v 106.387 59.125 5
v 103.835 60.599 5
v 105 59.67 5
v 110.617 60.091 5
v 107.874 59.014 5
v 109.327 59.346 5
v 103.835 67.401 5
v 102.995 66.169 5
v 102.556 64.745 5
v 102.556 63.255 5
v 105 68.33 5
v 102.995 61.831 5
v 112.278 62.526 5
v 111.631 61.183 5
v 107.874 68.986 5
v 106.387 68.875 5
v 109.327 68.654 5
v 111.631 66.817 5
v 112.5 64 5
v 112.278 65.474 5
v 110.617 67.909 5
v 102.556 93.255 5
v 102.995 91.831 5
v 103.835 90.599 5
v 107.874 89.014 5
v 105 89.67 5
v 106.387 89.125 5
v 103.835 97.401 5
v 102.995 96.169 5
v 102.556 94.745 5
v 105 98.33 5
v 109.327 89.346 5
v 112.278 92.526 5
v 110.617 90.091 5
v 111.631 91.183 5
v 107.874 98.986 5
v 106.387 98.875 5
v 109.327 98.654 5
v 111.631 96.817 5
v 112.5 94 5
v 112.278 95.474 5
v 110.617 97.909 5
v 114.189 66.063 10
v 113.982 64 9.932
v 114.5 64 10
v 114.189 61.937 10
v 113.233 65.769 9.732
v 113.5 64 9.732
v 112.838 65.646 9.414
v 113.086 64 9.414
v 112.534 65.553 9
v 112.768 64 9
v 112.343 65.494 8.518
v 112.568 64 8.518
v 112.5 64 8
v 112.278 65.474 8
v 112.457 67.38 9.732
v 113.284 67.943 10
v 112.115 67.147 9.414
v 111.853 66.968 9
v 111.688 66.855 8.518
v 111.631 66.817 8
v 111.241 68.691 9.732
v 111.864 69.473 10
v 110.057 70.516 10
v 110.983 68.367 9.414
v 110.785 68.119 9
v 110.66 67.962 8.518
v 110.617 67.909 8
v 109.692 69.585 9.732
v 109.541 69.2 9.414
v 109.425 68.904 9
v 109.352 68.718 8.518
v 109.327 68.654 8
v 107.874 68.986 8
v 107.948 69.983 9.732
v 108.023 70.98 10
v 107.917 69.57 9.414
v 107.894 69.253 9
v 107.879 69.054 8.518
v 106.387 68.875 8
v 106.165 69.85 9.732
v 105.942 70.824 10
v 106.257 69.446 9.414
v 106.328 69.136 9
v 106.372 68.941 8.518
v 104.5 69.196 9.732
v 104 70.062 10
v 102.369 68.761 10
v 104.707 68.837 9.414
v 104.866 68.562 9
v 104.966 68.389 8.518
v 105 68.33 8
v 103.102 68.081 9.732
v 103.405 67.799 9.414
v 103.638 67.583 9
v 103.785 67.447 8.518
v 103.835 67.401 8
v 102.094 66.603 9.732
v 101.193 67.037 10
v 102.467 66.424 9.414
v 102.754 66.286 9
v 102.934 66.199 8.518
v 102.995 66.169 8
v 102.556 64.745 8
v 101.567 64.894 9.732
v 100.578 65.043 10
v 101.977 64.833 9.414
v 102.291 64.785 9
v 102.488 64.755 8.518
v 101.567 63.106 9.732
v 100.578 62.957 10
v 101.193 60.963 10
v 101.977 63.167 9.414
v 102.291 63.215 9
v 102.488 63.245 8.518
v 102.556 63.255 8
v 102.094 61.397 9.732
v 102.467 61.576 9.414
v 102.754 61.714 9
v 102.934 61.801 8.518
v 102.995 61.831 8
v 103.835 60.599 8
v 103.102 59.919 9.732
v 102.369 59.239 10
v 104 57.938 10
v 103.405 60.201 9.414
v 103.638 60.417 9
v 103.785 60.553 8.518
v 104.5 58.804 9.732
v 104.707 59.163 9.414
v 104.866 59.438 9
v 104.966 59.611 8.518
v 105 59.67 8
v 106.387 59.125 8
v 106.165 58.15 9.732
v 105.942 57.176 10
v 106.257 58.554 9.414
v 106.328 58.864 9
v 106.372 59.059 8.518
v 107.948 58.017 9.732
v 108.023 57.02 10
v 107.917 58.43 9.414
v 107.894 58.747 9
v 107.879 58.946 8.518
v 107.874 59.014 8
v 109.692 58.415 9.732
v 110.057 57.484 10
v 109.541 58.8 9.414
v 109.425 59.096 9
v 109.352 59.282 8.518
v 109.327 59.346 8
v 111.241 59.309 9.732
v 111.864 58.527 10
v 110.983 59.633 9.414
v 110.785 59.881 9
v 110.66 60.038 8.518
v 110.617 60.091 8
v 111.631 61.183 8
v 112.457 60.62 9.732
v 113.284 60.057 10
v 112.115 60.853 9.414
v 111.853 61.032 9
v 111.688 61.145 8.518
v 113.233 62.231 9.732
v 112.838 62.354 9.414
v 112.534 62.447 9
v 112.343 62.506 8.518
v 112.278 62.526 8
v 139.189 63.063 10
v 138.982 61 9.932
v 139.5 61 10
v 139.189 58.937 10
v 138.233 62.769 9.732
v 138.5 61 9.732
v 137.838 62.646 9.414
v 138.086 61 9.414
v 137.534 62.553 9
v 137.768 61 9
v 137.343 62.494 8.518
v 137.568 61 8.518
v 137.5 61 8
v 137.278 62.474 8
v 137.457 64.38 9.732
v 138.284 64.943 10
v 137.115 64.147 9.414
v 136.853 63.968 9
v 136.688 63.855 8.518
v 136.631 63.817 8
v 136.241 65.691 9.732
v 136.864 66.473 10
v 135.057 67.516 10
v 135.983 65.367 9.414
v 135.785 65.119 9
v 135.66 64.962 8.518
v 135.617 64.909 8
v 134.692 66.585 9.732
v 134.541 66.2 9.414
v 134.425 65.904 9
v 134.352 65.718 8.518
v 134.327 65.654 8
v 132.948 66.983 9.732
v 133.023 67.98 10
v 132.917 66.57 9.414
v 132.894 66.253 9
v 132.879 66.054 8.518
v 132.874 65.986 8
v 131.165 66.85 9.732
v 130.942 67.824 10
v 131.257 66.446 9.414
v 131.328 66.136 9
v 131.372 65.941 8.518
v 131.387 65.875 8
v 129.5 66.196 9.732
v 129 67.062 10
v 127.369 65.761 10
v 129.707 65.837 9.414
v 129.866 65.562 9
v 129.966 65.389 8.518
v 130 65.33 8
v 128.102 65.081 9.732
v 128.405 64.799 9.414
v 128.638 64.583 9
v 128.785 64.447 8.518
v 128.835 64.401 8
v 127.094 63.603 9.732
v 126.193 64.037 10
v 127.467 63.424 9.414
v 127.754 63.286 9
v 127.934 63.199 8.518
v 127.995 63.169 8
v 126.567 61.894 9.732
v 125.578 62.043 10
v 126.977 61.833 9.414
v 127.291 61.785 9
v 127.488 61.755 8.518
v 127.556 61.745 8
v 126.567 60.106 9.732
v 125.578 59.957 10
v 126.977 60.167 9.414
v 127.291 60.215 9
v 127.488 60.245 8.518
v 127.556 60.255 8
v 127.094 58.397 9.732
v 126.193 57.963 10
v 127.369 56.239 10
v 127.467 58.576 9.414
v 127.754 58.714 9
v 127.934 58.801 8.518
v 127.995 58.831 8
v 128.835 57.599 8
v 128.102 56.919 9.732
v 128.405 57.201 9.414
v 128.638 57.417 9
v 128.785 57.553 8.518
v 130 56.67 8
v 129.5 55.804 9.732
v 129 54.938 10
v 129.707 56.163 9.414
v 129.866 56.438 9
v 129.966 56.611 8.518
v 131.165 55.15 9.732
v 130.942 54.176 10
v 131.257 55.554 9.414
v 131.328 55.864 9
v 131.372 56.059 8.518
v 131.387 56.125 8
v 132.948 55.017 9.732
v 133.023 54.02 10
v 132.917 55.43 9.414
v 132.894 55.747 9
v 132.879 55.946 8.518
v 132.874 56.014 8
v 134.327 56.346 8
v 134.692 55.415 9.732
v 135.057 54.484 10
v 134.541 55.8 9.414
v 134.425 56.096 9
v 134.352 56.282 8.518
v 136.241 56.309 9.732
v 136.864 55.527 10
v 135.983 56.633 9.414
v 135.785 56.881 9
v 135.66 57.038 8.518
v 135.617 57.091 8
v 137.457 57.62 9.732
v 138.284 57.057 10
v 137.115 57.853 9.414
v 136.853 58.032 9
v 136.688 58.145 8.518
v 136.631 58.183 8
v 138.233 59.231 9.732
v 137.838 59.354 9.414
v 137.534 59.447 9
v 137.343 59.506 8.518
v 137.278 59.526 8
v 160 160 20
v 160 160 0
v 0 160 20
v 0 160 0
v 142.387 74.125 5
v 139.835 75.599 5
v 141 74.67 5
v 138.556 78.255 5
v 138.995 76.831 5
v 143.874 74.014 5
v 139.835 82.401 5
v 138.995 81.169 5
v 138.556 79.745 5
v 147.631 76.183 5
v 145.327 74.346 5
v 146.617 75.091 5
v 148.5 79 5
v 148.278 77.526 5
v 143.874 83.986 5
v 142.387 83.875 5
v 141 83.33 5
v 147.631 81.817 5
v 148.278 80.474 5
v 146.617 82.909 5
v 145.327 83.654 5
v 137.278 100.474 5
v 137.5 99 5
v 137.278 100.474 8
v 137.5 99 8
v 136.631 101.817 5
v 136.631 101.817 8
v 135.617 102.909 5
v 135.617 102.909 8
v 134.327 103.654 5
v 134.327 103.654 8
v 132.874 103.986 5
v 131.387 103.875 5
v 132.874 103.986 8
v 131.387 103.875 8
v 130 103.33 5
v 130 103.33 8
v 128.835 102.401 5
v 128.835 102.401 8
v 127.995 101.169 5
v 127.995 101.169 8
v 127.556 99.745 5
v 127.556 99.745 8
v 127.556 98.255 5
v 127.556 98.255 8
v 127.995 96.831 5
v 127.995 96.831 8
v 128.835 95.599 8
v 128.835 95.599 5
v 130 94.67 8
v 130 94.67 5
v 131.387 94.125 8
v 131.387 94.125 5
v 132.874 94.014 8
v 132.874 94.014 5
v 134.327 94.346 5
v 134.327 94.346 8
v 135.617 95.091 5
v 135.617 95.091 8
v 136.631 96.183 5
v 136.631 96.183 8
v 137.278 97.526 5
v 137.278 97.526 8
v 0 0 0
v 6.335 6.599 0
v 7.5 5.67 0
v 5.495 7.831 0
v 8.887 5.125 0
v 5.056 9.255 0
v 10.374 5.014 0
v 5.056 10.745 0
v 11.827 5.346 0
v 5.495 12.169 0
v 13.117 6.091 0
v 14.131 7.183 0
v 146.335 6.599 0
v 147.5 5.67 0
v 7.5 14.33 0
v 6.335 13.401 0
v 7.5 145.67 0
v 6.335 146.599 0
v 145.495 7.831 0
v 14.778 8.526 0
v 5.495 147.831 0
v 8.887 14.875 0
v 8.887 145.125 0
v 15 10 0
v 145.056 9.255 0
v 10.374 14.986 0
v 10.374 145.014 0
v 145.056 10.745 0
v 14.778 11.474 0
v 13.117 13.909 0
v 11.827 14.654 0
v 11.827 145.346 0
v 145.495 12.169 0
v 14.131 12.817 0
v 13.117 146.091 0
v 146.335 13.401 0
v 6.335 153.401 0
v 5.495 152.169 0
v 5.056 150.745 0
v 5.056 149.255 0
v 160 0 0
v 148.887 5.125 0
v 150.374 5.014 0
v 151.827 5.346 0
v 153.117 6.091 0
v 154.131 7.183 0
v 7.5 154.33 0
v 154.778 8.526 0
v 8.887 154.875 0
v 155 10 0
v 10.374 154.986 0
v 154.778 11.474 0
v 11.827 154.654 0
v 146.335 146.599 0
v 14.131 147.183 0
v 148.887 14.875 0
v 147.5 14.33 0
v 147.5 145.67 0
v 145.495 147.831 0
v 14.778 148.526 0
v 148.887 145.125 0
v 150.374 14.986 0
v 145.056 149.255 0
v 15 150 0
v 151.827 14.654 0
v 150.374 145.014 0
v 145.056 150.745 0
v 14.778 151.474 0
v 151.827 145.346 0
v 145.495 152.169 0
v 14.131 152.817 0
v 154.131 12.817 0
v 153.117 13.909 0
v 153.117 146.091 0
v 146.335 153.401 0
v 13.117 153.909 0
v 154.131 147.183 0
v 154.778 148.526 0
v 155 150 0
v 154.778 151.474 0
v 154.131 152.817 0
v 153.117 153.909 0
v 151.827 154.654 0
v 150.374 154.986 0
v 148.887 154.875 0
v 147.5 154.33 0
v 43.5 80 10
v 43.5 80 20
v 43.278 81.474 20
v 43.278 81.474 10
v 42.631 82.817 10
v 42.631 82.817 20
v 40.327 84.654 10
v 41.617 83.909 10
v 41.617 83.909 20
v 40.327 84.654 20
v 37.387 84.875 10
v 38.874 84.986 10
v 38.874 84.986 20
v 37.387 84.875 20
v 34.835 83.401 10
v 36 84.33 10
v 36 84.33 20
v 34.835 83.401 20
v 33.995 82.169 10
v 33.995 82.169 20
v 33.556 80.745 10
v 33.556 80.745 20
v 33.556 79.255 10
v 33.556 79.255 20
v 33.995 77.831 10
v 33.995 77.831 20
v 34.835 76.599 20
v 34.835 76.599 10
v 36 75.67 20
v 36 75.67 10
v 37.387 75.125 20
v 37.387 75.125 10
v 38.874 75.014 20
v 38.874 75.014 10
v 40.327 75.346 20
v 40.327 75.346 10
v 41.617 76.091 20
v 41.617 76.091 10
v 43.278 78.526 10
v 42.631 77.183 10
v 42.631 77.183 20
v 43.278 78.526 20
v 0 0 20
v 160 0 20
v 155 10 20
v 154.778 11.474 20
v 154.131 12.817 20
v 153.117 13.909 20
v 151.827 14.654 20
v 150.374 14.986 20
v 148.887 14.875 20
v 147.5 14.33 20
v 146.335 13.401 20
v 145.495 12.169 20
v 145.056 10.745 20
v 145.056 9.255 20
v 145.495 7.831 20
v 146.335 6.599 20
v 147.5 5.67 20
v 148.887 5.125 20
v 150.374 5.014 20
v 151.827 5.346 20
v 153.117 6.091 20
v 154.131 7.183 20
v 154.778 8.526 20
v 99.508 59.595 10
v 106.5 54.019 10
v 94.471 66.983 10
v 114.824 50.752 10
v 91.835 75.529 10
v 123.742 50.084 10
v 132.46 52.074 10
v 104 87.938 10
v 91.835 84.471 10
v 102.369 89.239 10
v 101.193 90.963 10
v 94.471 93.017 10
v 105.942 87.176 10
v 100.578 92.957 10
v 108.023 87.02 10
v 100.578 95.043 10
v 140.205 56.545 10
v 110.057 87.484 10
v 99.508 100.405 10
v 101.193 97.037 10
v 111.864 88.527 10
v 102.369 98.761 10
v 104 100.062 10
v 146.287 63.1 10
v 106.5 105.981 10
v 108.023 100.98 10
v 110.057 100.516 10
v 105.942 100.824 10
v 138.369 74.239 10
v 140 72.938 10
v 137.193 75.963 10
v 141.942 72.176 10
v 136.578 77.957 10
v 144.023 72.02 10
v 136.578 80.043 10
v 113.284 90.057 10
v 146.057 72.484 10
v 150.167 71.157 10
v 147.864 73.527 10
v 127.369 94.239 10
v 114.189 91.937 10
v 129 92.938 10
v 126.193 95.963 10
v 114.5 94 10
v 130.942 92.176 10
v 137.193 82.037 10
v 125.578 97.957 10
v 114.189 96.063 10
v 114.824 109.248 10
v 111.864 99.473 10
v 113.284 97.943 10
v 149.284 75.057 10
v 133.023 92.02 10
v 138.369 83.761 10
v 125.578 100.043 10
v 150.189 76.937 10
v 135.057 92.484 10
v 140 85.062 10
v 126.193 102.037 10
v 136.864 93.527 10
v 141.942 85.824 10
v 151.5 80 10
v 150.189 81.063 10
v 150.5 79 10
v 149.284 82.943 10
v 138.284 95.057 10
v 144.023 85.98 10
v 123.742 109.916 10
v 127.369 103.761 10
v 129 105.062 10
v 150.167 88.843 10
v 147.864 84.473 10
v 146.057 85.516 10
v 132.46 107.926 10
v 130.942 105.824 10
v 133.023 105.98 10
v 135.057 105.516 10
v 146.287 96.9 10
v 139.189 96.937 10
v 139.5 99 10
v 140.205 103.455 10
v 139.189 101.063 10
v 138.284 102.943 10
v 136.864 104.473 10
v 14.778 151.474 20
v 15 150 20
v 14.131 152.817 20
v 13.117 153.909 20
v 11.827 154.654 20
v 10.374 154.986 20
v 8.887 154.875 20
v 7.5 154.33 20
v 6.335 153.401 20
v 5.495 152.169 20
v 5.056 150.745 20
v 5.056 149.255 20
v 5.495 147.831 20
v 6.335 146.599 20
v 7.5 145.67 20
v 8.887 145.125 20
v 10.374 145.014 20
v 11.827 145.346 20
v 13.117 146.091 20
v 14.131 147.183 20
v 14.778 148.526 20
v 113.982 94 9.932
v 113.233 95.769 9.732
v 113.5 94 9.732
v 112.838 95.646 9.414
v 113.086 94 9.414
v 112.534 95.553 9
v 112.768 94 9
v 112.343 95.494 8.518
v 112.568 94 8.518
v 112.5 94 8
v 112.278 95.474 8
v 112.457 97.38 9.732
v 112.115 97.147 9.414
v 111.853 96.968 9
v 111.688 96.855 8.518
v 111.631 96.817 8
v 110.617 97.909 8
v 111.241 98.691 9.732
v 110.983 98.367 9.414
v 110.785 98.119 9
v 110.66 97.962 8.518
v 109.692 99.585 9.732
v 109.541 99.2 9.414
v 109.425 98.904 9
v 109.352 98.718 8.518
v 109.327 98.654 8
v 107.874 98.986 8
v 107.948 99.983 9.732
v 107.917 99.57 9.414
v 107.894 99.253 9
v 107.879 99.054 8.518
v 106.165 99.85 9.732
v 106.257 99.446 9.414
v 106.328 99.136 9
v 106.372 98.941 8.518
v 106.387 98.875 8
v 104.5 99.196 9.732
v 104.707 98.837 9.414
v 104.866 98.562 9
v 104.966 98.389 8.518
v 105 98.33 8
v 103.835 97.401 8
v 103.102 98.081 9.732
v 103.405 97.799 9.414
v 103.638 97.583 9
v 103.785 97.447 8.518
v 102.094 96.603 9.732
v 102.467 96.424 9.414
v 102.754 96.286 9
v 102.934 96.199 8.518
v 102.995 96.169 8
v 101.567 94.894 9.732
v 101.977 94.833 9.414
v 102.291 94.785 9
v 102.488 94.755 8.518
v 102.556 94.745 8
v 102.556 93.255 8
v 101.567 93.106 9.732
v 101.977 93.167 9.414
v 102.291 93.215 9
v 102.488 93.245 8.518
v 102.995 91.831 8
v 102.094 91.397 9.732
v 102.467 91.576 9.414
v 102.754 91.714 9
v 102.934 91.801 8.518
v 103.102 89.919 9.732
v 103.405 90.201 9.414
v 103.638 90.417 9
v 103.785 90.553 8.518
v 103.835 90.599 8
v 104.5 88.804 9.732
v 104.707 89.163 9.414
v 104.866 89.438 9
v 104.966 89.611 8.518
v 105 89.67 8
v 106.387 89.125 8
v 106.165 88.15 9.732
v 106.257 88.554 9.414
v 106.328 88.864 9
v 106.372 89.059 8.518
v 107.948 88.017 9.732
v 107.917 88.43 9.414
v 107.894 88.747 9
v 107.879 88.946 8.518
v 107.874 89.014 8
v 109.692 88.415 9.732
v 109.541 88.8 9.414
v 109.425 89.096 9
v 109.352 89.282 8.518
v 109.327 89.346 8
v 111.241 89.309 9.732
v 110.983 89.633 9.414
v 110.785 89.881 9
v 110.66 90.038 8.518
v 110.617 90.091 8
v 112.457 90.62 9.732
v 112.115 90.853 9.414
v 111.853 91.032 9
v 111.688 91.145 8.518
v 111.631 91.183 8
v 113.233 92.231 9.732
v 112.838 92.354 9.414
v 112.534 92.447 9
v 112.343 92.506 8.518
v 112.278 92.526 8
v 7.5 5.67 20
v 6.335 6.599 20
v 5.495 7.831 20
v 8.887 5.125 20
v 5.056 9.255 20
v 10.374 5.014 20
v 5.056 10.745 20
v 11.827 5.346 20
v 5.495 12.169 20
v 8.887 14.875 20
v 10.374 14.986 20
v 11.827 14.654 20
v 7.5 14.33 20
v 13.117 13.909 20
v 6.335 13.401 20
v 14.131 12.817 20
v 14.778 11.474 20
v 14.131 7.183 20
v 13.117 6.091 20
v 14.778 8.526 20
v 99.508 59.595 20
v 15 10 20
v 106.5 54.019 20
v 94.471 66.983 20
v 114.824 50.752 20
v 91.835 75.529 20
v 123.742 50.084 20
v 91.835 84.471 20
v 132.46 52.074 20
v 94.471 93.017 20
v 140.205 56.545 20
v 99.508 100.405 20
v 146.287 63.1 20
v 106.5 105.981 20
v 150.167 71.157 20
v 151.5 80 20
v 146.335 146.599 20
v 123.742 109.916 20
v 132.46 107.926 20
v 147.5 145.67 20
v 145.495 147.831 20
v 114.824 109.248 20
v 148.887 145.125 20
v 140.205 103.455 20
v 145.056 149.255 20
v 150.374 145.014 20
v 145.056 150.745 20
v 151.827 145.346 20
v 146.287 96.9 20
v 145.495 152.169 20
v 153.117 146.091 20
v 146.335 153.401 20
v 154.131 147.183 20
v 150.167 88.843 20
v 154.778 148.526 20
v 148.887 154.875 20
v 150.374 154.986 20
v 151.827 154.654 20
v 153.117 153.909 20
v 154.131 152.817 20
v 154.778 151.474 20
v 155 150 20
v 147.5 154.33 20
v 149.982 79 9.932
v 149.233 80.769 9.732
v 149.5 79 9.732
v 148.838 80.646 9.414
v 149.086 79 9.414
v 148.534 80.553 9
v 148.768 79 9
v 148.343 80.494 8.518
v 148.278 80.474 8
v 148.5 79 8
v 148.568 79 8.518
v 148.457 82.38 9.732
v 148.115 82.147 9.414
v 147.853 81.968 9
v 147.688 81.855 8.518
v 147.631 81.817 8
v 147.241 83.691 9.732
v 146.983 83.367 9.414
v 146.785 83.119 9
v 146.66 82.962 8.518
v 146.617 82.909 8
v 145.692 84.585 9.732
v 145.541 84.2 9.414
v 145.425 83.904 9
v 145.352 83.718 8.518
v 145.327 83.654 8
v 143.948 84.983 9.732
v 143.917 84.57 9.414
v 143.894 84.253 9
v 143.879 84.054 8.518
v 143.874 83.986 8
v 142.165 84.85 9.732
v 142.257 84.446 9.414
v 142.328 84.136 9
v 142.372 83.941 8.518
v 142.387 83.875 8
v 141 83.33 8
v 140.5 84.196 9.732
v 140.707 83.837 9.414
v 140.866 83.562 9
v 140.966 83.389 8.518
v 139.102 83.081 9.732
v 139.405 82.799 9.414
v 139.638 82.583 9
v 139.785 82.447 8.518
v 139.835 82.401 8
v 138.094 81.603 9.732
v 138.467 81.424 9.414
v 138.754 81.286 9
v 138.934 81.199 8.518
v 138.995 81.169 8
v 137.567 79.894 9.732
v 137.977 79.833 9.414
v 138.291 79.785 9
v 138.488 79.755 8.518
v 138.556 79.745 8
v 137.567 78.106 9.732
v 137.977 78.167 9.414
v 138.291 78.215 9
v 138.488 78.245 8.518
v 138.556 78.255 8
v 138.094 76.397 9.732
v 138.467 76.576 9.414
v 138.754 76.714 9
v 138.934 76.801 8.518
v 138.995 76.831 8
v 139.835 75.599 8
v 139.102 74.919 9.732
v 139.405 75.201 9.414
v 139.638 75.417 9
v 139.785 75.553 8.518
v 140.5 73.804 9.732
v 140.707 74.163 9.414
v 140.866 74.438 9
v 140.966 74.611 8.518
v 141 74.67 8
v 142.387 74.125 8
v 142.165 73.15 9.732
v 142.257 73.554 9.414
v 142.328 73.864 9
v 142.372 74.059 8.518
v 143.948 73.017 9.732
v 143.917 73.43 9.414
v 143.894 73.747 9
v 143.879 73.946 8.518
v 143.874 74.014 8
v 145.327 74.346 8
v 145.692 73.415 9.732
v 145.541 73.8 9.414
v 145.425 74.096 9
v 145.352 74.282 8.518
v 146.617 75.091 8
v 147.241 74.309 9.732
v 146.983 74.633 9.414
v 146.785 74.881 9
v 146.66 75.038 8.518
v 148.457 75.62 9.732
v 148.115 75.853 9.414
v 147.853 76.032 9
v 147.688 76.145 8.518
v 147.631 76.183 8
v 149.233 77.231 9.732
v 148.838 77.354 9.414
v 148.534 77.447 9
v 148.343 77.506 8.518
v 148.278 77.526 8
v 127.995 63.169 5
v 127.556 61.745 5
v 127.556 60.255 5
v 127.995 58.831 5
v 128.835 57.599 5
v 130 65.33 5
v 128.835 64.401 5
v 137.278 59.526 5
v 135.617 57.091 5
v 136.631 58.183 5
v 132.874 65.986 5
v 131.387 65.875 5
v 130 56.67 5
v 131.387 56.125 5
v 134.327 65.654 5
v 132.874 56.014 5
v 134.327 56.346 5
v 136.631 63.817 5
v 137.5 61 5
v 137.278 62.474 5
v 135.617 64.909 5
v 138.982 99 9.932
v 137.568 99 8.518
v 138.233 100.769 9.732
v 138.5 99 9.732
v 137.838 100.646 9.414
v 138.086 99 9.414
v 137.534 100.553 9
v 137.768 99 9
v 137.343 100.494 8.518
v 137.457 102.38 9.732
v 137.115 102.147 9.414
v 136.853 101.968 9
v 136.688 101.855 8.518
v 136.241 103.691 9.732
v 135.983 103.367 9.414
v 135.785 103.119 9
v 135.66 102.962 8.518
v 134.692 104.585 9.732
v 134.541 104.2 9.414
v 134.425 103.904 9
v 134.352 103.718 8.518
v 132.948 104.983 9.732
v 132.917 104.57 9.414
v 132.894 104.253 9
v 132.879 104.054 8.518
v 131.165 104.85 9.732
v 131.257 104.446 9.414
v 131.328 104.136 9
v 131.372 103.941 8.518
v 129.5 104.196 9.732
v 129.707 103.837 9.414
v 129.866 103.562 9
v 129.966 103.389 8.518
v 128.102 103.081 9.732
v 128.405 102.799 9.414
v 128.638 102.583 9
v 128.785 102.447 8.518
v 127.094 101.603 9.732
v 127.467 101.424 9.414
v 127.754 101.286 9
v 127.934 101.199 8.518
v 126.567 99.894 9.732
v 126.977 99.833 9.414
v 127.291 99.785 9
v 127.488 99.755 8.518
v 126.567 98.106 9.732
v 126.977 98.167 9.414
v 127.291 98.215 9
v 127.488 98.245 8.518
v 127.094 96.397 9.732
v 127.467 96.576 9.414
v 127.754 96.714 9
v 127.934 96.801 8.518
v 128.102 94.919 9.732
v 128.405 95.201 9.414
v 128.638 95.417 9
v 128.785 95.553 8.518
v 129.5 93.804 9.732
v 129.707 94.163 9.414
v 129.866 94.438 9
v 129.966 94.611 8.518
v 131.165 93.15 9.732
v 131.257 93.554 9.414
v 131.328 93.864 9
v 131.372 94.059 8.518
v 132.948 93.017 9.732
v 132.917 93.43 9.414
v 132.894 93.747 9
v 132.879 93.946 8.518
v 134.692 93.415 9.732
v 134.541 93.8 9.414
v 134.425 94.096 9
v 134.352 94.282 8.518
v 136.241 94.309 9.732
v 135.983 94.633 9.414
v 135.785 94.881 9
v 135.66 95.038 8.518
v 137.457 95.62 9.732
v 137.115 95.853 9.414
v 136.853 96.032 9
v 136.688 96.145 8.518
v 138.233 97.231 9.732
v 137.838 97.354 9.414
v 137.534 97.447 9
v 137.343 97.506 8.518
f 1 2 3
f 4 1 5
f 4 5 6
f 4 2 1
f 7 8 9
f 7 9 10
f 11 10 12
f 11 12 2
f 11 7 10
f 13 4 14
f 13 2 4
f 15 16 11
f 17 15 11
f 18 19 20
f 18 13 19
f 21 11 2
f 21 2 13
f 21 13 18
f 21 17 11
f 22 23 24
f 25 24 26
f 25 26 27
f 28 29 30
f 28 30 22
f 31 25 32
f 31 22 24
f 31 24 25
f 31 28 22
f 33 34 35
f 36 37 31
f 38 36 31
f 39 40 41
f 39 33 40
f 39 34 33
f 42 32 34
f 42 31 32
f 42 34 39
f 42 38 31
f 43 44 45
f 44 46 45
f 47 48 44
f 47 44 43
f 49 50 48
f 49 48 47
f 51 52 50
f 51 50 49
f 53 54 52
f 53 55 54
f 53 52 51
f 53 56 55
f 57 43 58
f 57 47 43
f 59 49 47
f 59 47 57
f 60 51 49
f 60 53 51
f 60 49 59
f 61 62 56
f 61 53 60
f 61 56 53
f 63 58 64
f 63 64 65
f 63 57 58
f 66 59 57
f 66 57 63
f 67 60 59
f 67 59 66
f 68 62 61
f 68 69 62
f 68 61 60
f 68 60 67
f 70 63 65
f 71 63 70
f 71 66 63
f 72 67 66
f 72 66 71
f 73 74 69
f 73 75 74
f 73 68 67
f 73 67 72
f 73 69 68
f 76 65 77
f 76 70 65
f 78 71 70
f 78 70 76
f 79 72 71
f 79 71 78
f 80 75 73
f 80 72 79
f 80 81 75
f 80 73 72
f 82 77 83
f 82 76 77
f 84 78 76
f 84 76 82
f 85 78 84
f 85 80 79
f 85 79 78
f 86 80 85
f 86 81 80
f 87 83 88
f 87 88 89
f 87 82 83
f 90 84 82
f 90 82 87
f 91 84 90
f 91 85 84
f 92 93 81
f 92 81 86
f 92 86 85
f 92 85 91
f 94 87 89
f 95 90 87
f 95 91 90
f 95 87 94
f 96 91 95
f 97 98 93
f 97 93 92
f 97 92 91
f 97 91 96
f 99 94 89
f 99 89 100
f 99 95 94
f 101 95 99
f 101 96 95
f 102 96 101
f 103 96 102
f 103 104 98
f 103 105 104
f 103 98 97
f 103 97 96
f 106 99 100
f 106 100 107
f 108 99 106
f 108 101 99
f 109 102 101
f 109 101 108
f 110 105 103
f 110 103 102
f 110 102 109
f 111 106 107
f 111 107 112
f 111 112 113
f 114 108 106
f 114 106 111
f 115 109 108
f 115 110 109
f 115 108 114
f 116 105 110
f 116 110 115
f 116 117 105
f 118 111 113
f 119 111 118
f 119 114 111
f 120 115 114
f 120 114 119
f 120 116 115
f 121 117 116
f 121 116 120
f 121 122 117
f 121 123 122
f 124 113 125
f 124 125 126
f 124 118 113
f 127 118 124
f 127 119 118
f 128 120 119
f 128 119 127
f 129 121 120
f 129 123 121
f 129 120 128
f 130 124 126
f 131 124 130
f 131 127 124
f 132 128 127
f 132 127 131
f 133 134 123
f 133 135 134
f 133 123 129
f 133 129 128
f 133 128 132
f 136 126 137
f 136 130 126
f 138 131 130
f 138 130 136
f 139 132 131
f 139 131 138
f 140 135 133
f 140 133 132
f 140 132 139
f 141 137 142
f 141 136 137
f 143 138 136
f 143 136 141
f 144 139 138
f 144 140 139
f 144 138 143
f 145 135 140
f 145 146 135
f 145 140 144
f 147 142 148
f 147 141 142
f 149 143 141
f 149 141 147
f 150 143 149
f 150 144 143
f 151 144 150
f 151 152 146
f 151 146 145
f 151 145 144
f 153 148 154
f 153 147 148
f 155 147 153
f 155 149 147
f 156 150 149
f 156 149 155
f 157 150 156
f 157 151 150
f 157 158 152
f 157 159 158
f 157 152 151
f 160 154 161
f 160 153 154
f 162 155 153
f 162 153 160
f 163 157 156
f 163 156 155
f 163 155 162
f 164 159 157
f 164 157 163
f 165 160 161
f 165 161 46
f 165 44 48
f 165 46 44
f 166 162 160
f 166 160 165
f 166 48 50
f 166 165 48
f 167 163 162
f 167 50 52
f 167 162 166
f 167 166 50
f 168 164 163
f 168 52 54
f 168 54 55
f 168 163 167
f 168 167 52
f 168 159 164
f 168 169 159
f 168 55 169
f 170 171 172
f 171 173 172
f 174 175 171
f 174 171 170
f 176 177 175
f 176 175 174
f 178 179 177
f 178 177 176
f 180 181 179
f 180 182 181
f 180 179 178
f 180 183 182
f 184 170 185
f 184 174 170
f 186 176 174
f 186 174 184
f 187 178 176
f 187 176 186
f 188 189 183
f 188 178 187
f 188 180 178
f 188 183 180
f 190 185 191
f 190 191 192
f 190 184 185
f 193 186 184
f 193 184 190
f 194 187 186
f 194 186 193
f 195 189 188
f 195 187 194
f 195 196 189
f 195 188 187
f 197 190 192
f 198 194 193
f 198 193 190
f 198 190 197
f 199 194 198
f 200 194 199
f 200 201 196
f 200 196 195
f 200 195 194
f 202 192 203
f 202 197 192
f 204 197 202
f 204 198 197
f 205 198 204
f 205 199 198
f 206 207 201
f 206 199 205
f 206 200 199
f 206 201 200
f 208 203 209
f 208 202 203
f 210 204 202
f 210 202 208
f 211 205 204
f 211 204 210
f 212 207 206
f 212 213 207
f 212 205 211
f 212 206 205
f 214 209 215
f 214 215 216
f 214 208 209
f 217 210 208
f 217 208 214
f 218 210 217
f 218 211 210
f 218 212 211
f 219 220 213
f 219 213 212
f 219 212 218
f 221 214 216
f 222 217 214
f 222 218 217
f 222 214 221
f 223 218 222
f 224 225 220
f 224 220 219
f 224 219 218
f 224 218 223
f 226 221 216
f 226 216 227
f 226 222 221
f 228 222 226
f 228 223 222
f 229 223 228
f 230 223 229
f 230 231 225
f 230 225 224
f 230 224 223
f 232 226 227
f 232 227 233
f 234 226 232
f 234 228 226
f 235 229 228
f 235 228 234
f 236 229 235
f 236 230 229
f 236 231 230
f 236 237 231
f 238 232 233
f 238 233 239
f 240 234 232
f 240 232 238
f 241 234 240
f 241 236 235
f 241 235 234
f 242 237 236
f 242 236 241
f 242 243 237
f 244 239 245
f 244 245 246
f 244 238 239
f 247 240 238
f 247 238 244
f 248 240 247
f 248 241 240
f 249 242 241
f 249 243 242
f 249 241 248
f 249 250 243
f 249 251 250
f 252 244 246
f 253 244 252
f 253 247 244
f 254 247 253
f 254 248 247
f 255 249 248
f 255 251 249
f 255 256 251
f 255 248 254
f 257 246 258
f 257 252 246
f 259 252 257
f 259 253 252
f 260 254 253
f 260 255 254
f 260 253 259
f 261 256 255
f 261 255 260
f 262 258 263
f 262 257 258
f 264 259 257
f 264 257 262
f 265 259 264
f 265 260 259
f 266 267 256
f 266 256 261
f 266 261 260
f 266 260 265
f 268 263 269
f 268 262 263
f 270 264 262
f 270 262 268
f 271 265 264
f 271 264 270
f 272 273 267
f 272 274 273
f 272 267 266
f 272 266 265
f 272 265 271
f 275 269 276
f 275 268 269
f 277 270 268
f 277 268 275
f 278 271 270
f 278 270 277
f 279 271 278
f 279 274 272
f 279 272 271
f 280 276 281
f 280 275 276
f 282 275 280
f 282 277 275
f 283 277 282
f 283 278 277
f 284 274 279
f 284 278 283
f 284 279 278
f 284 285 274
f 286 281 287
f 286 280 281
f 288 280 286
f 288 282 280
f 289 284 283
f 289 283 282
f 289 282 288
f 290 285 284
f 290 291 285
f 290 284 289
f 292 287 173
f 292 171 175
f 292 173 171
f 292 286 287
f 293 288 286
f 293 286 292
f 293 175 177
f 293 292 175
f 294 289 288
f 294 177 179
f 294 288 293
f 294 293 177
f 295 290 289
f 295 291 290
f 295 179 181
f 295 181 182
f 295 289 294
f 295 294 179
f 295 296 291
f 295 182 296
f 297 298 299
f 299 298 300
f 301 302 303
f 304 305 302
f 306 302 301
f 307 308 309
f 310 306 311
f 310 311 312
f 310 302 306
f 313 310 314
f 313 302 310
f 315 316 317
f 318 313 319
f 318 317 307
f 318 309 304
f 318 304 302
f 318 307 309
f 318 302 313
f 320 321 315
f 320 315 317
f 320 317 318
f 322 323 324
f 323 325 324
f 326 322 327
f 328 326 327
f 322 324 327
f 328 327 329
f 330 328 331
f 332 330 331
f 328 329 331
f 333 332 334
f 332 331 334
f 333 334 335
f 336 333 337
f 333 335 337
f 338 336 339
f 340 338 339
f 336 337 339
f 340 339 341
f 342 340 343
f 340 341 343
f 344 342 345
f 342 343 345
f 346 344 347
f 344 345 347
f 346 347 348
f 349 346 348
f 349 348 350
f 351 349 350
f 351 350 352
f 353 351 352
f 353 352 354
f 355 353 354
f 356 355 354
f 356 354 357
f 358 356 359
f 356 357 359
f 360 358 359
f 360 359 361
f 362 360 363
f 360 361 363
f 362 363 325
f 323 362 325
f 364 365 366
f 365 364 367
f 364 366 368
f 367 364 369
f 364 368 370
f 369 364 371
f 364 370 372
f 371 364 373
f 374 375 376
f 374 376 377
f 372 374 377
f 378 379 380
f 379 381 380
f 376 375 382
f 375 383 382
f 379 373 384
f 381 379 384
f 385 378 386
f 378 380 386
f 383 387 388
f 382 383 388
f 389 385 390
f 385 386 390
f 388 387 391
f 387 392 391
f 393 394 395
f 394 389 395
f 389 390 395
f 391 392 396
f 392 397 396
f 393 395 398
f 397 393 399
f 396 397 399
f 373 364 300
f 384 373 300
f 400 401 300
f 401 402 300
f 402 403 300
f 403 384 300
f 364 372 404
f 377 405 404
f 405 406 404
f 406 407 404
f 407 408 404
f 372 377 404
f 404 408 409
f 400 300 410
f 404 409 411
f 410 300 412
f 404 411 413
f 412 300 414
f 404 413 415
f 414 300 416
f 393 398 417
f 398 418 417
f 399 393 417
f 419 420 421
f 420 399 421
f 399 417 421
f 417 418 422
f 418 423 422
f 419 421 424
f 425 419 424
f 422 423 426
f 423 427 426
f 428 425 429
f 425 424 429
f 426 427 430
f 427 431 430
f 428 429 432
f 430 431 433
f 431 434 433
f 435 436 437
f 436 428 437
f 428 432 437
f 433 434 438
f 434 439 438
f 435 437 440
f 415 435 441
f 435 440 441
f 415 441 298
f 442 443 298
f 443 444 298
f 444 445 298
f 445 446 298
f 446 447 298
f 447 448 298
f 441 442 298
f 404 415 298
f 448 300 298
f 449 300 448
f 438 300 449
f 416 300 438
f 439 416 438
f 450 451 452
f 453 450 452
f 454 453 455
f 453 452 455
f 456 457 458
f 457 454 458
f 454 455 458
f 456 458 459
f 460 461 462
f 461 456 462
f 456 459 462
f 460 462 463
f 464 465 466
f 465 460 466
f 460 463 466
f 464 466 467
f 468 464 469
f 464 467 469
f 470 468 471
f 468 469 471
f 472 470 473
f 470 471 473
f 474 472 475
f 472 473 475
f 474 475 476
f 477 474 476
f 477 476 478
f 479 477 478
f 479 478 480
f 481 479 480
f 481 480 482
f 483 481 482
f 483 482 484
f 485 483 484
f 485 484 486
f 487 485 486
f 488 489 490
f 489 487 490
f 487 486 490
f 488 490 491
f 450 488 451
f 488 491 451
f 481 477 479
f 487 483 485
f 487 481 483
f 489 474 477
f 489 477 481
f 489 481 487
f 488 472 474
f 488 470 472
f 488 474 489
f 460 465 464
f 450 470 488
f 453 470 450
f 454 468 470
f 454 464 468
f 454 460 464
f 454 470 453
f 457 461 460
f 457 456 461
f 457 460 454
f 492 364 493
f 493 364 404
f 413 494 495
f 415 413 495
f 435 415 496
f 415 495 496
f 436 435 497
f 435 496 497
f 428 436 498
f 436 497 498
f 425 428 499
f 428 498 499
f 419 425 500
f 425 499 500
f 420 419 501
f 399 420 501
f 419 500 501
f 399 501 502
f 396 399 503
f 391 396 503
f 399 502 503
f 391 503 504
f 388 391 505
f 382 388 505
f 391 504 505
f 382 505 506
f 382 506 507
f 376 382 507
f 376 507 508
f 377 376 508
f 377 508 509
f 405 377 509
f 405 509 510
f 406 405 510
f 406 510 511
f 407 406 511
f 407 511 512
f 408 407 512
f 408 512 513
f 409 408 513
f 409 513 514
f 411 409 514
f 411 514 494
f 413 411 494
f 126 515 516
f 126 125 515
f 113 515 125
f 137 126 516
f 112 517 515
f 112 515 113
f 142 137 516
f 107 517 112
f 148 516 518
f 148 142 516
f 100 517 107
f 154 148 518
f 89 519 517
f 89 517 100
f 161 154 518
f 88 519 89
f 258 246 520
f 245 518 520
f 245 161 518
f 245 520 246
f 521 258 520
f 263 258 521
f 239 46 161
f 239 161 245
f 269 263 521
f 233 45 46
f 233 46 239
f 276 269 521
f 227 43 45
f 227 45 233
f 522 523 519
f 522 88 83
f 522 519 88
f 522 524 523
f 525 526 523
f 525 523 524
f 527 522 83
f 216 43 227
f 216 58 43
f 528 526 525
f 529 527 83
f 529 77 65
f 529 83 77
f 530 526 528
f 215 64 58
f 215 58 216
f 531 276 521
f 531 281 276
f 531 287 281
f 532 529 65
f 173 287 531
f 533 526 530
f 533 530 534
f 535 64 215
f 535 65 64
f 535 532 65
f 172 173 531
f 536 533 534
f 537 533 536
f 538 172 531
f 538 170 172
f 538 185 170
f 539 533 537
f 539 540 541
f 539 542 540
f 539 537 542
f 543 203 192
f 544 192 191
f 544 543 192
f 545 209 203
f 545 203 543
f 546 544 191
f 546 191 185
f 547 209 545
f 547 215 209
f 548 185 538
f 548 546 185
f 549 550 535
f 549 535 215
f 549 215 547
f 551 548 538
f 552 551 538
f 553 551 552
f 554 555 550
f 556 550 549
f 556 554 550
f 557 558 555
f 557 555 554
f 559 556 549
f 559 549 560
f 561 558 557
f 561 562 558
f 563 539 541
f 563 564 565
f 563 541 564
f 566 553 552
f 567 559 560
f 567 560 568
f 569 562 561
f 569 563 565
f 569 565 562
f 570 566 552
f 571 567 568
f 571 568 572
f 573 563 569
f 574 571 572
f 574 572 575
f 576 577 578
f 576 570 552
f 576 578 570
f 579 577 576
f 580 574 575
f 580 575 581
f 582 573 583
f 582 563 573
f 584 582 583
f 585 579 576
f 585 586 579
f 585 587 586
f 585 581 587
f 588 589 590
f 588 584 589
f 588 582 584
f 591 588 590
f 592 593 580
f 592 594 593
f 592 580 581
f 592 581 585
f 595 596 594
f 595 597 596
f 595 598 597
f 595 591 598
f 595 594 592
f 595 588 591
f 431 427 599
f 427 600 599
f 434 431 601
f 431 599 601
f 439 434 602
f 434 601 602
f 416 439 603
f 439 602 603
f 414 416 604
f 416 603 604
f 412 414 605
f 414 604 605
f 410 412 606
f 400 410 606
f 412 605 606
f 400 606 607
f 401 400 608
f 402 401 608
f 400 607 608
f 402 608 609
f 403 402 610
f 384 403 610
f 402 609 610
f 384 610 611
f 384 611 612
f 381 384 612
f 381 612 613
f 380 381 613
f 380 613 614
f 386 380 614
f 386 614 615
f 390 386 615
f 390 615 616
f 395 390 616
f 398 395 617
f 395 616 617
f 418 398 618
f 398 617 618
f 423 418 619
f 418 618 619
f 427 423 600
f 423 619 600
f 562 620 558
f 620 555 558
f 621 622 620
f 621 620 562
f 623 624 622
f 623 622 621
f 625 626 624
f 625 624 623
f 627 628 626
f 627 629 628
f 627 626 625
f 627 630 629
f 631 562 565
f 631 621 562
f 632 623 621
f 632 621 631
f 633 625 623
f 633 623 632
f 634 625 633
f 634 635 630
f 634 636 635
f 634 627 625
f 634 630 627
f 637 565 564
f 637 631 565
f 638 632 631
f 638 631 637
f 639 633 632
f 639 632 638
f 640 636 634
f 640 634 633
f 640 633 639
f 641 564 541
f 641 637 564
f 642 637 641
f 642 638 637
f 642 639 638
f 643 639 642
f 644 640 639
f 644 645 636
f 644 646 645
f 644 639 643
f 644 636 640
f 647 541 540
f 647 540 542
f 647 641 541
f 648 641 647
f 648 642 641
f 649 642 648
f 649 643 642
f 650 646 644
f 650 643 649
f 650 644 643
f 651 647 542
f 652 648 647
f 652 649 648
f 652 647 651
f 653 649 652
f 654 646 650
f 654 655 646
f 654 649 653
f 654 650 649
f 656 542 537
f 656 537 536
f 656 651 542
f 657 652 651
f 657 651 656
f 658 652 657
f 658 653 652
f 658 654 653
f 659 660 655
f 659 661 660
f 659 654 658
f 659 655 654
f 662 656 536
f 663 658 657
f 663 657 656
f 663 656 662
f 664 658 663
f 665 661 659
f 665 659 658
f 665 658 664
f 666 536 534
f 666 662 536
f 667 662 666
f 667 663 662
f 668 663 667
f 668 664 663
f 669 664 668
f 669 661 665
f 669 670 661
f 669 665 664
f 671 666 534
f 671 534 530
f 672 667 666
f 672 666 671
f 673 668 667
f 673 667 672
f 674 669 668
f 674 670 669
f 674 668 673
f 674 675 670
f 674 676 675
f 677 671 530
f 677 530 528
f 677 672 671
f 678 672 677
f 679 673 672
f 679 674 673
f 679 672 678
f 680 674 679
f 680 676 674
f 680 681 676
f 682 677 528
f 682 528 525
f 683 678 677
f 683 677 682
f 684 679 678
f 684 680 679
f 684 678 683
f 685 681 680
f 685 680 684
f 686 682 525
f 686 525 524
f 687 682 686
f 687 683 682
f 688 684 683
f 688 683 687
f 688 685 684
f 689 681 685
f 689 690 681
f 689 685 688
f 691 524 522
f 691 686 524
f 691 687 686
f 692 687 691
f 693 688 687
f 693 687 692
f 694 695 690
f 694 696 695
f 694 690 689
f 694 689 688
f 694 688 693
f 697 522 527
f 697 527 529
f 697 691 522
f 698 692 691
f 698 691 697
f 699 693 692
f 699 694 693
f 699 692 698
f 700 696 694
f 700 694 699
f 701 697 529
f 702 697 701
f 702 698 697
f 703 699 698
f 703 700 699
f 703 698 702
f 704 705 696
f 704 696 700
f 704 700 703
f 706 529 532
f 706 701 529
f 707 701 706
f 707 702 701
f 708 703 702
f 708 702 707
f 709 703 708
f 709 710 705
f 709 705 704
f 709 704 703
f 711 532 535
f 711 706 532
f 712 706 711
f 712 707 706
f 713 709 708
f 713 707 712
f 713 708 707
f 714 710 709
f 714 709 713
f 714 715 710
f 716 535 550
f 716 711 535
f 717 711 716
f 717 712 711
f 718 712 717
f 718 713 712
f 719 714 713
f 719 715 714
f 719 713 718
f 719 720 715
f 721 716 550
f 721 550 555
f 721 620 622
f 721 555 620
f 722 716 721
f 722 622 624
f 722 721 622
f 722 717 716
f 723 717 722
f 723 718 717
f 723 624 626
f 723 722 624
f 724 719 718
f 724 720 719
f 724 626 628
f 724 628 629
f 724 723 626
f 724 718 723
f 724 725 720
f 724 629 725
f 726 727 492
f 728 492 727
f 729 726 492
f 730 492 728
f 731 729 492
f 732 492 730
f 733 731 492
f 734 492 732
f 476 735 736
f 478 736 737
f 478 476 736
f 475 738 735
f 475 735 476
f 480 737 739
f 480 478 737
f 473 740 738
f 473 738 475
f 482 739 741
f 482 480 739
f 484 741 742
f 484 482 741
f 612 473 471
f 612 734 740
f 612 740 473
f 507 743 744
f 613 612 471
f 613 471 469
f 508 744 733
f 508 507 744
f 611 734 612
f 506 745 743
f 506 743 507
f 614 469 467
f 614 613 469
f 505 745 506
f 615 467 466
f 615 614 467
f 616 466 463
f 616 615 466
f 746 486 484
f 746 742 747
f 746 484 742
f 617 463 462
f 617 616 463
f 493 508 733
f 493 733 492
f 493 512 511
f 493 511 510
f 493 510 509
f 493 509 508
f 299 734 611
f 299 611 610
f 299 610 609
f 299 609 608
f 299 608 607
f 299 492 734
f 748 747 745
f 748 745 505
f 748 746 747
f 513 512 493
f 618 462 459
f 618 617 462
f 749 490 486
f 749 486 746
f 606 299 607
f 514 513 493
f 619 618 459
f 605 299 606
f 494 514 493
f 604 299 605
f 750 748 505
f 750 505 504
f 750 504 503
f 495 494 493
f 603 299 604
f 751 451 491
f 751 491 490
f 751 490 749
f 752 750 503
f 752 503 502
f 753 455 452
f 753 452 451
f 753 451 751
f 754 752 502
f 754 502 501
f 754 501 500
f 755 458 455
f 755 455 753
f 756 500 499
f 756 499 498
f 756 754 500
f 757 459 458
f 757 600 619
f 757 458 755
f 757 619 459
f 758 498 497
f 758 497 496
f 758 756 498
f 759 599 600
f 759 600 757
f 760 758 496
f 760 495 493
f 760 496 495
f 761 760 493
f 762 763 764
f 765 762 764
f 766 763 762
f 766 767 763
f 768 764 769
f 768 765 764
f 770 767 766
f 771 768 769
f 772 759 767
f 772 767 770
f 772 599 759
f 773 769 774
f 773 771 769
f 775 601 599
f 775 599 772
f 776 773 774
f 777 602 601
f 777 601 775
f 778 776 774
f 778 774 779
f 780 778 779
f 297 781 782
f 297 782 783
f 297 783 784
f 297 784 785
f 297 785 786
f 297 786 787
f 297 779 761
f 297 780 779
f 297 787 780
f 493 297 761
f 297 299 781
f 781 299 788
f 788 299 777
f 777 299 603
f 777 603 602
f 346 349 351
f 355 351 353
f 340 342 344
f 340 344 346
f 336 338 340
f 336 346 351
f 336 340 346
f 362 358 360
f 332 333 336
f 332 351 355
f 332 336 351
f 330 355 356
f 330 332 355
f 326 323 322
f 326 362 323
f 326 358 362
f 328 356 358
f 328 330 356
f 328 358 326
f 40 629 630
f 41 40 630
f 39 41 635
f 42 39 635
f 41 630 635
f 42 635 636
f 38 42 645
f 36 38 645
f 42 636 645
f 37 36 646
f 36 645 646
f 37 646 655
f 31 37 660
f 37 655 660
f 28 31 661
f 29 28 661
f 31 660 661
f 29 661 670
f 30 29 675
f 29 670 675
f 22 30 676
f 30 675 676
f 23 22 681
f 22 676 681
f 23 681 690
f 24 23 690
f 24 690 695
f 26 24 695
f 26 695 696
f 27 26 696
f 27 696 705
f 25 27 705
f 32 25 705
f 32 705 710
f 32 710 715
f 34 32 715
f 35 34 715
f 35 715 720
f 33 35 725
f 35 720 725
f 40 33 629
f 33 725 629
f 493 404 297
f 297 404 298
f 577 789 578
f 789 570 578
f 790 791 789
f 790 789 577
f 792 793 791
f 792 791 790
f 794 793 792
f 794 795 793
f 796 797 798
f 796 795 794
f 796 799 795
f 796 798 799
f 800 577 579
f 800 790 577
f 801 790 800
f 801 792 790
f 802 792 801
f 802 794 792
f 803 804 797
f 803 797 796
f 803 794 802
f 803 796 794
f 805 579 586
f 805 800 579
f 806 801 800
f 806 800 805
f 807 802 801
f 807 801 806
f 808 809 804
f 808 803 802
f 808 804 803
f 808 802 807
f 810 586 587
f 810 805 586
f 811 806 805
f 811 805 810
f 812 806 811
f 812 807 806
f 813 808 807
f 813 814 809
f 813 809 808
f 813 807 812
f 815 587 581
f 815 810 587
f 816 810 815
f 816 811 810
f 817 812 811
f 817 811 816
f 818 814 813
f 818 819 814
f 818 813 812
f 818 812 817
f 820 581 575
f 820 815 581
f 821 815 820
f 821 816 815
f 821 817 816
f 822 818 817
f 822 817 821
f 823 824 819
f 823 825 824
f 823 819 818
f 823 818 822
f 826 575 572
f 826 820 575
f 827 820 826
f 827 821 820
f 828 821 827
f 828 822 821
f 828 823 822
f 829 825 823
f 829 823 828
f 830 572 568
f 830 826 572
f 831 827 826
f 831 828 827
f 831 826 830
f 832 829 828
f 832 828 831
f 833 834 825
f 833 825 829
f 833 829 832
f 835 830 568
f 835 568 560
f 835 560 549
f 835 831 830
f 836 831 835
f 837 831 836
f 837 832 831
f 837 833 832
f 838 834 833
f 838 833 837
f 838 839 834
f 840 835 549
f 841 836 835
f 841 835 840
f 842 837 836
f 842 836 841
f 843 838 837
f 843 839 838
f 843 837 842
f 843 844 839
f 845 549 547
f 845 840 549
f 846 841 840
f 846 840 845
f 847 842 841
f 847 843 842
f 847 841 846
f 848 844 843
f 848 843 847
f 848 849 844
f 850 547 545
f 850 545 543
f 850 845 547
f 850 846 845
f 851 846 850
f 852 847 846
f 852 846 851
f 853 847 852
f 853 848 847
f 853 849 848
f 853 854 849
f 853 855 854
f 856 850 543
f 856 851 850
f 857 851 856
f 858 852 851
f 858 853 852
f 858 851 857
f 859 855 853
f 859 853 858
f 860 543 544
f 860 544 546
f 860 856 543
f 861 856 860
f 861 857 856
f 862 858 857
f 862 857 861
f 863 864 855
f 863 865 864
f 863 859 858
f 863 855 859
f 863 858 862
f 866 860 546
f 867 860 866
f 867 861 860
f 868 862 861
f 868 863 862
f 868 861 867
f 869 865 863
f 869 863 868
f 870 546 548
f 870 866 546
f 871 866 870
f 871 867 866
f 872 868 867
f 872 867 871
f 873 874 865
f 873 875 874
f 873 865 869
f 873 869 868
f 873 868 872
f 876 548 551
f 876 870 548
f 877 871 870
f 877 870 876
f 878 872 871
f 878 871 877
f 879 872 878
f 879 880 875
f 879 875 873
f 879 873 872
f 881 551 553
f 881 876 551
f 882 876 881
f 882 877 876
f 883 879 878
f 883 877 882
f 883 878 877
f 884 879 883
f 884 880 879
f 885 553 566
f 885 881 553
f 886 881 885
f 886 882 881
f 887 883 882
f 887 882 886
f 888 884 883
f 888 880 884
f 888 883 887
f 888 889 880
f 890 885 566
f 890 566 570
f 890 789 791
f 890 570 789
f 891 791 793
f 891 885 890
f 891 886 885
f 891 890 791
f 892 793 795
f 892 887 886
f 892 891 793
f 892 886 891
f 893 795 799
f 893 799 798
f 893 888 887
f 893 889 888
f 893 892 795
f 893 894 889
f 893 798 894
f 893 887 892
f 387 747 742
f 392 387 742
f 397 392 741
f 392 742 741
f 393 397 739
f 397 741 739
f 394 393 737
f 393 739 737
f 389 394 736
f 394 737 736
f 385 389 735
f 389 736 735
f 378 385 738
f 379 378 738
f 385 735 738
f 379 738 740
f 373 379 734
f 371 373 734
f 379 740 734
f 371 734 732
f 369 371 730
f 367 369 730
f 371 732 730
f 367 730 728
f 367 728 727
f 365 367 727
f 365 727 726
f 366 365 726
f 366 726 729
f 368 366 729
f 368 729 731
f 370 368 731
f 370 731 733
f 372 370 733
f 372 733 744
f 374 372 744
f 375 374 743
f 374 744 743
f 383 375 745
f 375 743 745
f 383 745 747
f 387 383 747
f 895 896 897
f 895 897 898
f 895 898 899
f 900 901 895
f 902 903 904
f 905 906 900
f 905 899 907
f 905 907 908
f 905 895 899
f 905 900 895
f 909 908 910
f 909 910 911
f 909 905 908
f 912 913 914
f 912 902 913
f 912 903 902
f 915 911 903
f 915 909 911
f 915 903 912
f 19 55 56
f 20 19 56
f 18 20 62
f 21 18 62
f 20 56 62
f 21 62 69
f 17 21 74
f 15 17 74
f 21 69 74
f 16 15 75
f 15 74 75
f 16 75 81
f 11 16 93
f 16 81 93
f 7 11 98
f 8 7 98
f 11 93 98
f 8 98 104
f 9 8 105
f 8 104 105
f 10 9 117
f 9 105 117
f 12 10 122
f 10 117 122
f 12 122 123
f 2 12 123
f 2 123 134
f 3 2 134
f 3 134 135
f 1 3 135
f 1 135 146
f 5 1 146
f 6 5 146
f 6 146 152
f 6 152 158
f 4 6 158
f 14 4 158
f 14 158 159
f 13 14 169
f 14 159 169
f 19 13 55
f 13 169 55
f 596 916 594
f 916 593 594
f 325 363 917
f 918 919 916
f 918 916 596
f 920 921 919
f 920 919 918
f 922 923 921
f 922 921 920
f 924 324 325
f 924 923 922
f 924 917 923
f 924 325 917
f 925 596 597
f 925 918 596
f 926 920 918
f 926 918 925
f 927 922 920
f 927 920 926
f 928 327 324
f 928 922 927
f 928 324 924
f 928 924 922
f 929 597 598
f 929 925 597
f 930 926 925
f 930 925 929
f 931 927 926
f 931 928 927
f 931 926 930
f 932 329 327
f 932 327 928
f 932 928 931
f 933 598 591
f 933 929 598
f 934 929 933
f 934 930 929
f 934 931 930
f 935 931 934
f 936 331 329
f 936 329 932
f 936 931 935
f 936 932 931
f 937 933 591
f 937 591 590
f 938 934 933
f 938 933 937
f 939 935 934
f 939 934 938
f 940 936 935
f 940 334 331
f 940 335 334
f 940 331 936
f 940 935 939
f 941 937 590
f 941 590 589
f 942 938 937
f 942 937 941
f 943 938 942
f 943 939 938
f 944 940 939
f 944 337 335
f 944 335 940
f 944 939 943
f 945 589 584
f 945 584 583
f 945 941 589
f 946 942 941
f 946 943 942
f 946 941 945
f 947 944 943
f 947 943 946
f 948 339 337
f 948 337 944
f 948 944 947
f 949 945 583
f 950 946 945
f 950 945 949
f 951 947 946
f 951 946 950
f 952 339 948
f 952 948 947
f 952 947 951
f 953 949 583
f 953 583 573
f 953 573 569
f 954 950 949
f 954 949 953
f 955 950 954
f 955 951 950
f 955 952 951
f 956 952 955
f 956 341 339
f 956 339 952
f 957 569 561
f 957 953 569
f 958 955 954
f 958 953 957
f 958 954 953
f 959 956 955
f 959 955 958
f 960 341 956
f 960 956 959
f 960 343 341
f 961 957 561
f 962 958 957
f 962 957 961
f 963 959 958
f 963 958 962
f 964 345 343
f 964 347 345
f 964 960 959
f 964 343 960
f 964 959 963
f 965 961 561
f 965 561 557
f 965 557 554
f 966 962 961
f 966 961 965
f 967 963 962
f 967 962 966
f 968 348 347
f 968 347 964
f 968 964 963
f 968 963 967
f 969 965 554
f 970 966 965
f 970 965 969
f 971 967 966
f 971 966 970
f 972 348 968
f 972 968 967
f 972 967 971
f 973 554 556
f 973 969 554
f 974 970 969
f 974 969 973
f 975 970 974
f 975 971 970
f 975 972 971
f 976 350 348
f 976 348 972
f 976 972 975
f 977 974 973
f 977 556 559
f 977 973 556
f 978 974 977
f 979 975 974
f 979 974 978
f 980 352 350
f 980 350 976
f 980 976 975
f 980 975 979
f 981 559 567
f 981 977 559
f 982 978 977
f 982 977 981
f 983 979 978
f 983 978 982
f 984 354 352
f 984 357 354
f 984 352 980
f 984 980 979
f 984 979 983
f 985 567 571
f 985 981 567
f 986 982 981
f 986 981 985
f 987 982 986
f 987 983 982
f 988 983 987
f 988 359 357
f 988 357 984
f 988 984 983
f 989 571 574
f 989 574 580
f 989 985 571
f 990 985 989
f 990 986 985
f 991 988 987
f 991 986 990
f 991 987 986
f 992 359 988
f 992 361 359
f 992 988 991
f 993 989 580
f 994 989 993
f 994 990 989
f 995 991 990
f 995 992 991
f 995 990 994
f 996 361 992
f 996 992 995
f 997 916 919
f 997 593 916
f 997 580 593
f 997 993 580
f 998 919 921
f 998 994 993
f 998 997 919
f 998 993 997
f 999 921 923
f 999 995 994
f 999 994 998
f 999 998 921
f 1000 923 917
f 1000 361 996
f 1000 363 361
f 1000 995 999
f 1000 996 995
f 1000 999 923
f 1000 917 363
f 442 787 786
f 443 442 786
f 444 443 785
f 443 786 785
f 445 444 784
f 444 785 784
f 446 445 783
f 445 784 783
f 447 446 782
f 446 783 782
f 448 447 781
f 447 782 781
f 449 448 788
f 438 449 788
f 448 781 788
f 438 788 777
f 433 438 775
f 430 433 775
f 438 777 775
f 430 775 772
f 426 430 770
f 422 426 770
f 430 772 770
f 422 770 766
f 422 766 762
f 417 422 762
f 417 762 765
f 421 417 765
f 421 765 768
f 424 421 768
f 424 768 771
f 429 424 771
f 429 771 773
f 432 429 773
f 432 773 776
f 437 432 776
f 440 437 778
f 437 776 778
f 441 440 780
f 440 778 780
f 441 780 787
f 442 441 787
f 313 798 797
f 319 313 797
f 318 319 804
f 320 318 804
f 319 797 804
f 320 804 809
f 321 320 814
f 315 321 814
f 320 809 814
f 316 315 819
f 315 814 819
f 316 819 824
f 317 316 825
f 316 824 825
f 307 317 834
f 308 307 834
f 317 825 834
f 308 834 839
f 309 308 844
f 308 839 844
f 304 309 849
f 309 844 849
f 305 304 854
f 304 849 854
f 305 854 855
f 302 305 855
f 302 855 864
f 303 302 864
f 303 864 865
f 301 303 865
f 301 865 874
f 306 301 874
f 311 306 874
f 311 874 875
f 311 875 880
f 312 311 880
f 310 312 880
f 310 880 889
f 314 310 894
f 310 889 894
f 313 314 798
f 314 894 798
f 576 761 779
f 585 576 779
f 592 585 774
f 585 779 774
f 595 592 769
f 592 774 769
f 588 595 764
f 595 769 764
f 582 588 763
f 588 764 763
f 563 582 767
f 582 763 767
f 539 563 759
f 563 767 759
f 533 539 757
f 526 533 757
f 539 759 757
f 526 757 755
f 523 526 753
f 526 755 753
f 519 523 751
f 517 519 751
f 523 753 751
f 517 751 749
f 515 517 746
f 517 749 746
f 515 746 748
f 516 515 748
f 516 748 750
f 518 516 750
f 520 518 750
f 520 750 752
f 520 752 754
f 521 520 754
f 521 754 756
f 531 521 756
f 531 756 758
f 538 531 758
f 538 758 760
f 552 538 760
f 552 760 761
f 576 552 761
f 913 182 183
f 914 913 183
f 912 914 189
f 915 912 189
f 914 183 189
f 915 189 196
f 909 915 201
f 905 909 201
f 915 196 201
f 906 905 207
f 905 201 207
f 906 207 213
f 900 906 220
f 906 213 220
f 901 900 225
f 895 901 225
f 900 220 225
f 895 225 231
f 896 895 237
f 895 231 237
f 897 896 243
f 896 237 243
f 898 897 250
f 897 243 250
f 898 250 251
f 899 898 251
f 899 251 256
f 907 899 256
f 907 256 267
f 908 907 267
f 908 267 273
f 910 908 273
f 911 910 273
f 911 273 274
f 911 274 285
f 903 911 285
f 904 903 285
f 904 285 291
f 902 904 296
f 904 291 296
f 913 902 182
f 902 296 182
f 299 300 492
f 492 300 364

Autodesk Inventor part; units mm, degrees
ref_plane "YZ Plane" through (0, 0, 0) normal (1, 0, 0) x (0, 1, 0)
ref_plane "XZ Plane" through (0, 0, 0) normal (0, 1, 0) x (-1, 0, 0)
ref_plane "XY Plane" through (0, 0, 0) normal (0, 0, 1) x (1, 0, 0)
sketch "Sketch1" plane through (0, 0, 0) normal (0, 0, 1) x (1, 0, 0)
  line L0 (0, 0) -> (160, 0)
  line L1 (160, 0) -> (160, 160)
  line L2 (160, 160) -> (0, 160)
  line L3 (0, 160) -> (0, 0)
  dimension "d0" = 160
  dimension "d1" = 160
extrude "Extrusion1" add sketch "Sketch1" along normal blind 20
sketch "Sketch2" plane through (0, 0, 20) normal (0, 0, 1) x (1, 0, 0)
  line L0 (160, 160) -> (0, 160) projected
  line L1 (0, 160) -> (10, 160)
  line L2 (10, 160) -> (10, 10)
  line L3 (10, 10) -> (150, 10)
  line L4 (150, 10) -> (150, 150)
  line L5 (150, 150) -> (10, 150)
  circle A0 centre (10, 150) radius 5
  circle A1 centre (150, 150) radius 5
  circle A2 centre (10, 10) radius 5
  circle A3 centre (150, 10) radius 5
  line L6 (0, 0) -> (0, 80)
  line L7 (0, 160) -> (0, 0) projected
  line L8 (0, 80) -> (38.5, 80)
  circle A4 centre (38.5, 80) radius 5
  line L9 (0, 0) -> (160, 0) projected
  line L10 (160, 0) -> (160, 80)
  line L11 (160, 0) -> (160, 160) projected
  line L12 (160, 80) -> (160, 8)
  line L13 (160, 80) -> (121.5, 80)
  circle A5 centre (121.5, 80) radius 30
  dimension "d4" = 10
  dimension "d5" = 150
  dimension "d6" = 140
  dimension "d7" = 140
  dimension "d8" = 140
  dimension "d9" = 10
  dimension "d10" = 10
  dimension "d11" = 10
  dimension "d12" = 10
  dimension "d13" = 80
  dimension "d14" = 38.5
  dimension "d15" = 10
  dimension "d16" = 80
  dimension "d17" = 38.5
  dimension "d18" = 60
extrude "Extrusion2" cut sketch "Sketch2" against normal through all contours A0 L5 L2 | L2 A0 | L5 A0 L2 | A1 L4 L5 | L5 L4 A1 | A3 L3 L4 | L4 L3 A3 | A2 L3 L2 | L2 L3 A2
sketch "Sketch3" plane through (0, 0, 20) normal (0, 0, 1) x (1, 0, 0)
  line L0 (0, 0) -> (160, 0) projected
  line L1 (0, 0) -> (0, 80)
  line L2 (0, 160) -> (0, 0) projected
  line L3 (0, 80) -> (38.5, 80)
  circle A0 centre (38.5, 80) radius 5
  line L4 (160, 0) -> (160, 11)
  dimension "d21" = 80
  dimension "d22" = 38.5
  dimension "d23" = 10
extrude "Extrusion3" cut sketch "Sketch3" against normal blind 10
sketch "Sketch4" plane through (0, 0, 20) normal (0, 0, 1) x (1, 0, 0)
  line L0 (160, 0) -> (160, 160) projected
  line L1 (160, 0) -> (160, 80)
  line L2 (160, 80) -> (121.5, 80)
  circle A0 centre (121.5, 80) radius 30
  point P0 (0, 0)
  dimension "d26" = 80
  dimension "d27" = 38.5
  dimension "d28" = 60
extrude "Extrusion4" cut sketch "Sketch4" against normal blind 10
sketch "Sketch5" plane through (121.5, 80, 10) normal (0, 0, 1) x (1, 0, 0)
  line L0 (-30, 0) -> (-20, 0)
  line L1 (-20, 0) -> (-25, 0)
  point P0 (-121.5, -80)
  dimension "d31" = 10
sketch "Sketch6" plane through (121.5, 80, 10) normal (0, 0, 1) x (1, 0, 0)
  circle A0 centre (-14, -16) radius 5
  circle A1 centre (-14, 14) radius 5
  circle A2 centre (11, 19) radius 5
  circle A3 centre (22, -1) radius 5
  circle A4 centre (11, -19) radius 5
  point P0 (-121.5, -80)
  dimension "d32" = 10
  dimension "d33" = 10
  dimension "d34" = 10
  dimension "d35" = 10
  dimension "d36" = 10
extrude "Extrusion5" cut sketch "Sketch6" against normal blind 5
fillet "Fillet1" radius 2 5 edges at (102.5, 94, 10) (102.5, 64, 10) (127.5, 61, 10) (138.5, 79, 10) (127.5, 99, 10)
properties part number "bottom part of capping system"
